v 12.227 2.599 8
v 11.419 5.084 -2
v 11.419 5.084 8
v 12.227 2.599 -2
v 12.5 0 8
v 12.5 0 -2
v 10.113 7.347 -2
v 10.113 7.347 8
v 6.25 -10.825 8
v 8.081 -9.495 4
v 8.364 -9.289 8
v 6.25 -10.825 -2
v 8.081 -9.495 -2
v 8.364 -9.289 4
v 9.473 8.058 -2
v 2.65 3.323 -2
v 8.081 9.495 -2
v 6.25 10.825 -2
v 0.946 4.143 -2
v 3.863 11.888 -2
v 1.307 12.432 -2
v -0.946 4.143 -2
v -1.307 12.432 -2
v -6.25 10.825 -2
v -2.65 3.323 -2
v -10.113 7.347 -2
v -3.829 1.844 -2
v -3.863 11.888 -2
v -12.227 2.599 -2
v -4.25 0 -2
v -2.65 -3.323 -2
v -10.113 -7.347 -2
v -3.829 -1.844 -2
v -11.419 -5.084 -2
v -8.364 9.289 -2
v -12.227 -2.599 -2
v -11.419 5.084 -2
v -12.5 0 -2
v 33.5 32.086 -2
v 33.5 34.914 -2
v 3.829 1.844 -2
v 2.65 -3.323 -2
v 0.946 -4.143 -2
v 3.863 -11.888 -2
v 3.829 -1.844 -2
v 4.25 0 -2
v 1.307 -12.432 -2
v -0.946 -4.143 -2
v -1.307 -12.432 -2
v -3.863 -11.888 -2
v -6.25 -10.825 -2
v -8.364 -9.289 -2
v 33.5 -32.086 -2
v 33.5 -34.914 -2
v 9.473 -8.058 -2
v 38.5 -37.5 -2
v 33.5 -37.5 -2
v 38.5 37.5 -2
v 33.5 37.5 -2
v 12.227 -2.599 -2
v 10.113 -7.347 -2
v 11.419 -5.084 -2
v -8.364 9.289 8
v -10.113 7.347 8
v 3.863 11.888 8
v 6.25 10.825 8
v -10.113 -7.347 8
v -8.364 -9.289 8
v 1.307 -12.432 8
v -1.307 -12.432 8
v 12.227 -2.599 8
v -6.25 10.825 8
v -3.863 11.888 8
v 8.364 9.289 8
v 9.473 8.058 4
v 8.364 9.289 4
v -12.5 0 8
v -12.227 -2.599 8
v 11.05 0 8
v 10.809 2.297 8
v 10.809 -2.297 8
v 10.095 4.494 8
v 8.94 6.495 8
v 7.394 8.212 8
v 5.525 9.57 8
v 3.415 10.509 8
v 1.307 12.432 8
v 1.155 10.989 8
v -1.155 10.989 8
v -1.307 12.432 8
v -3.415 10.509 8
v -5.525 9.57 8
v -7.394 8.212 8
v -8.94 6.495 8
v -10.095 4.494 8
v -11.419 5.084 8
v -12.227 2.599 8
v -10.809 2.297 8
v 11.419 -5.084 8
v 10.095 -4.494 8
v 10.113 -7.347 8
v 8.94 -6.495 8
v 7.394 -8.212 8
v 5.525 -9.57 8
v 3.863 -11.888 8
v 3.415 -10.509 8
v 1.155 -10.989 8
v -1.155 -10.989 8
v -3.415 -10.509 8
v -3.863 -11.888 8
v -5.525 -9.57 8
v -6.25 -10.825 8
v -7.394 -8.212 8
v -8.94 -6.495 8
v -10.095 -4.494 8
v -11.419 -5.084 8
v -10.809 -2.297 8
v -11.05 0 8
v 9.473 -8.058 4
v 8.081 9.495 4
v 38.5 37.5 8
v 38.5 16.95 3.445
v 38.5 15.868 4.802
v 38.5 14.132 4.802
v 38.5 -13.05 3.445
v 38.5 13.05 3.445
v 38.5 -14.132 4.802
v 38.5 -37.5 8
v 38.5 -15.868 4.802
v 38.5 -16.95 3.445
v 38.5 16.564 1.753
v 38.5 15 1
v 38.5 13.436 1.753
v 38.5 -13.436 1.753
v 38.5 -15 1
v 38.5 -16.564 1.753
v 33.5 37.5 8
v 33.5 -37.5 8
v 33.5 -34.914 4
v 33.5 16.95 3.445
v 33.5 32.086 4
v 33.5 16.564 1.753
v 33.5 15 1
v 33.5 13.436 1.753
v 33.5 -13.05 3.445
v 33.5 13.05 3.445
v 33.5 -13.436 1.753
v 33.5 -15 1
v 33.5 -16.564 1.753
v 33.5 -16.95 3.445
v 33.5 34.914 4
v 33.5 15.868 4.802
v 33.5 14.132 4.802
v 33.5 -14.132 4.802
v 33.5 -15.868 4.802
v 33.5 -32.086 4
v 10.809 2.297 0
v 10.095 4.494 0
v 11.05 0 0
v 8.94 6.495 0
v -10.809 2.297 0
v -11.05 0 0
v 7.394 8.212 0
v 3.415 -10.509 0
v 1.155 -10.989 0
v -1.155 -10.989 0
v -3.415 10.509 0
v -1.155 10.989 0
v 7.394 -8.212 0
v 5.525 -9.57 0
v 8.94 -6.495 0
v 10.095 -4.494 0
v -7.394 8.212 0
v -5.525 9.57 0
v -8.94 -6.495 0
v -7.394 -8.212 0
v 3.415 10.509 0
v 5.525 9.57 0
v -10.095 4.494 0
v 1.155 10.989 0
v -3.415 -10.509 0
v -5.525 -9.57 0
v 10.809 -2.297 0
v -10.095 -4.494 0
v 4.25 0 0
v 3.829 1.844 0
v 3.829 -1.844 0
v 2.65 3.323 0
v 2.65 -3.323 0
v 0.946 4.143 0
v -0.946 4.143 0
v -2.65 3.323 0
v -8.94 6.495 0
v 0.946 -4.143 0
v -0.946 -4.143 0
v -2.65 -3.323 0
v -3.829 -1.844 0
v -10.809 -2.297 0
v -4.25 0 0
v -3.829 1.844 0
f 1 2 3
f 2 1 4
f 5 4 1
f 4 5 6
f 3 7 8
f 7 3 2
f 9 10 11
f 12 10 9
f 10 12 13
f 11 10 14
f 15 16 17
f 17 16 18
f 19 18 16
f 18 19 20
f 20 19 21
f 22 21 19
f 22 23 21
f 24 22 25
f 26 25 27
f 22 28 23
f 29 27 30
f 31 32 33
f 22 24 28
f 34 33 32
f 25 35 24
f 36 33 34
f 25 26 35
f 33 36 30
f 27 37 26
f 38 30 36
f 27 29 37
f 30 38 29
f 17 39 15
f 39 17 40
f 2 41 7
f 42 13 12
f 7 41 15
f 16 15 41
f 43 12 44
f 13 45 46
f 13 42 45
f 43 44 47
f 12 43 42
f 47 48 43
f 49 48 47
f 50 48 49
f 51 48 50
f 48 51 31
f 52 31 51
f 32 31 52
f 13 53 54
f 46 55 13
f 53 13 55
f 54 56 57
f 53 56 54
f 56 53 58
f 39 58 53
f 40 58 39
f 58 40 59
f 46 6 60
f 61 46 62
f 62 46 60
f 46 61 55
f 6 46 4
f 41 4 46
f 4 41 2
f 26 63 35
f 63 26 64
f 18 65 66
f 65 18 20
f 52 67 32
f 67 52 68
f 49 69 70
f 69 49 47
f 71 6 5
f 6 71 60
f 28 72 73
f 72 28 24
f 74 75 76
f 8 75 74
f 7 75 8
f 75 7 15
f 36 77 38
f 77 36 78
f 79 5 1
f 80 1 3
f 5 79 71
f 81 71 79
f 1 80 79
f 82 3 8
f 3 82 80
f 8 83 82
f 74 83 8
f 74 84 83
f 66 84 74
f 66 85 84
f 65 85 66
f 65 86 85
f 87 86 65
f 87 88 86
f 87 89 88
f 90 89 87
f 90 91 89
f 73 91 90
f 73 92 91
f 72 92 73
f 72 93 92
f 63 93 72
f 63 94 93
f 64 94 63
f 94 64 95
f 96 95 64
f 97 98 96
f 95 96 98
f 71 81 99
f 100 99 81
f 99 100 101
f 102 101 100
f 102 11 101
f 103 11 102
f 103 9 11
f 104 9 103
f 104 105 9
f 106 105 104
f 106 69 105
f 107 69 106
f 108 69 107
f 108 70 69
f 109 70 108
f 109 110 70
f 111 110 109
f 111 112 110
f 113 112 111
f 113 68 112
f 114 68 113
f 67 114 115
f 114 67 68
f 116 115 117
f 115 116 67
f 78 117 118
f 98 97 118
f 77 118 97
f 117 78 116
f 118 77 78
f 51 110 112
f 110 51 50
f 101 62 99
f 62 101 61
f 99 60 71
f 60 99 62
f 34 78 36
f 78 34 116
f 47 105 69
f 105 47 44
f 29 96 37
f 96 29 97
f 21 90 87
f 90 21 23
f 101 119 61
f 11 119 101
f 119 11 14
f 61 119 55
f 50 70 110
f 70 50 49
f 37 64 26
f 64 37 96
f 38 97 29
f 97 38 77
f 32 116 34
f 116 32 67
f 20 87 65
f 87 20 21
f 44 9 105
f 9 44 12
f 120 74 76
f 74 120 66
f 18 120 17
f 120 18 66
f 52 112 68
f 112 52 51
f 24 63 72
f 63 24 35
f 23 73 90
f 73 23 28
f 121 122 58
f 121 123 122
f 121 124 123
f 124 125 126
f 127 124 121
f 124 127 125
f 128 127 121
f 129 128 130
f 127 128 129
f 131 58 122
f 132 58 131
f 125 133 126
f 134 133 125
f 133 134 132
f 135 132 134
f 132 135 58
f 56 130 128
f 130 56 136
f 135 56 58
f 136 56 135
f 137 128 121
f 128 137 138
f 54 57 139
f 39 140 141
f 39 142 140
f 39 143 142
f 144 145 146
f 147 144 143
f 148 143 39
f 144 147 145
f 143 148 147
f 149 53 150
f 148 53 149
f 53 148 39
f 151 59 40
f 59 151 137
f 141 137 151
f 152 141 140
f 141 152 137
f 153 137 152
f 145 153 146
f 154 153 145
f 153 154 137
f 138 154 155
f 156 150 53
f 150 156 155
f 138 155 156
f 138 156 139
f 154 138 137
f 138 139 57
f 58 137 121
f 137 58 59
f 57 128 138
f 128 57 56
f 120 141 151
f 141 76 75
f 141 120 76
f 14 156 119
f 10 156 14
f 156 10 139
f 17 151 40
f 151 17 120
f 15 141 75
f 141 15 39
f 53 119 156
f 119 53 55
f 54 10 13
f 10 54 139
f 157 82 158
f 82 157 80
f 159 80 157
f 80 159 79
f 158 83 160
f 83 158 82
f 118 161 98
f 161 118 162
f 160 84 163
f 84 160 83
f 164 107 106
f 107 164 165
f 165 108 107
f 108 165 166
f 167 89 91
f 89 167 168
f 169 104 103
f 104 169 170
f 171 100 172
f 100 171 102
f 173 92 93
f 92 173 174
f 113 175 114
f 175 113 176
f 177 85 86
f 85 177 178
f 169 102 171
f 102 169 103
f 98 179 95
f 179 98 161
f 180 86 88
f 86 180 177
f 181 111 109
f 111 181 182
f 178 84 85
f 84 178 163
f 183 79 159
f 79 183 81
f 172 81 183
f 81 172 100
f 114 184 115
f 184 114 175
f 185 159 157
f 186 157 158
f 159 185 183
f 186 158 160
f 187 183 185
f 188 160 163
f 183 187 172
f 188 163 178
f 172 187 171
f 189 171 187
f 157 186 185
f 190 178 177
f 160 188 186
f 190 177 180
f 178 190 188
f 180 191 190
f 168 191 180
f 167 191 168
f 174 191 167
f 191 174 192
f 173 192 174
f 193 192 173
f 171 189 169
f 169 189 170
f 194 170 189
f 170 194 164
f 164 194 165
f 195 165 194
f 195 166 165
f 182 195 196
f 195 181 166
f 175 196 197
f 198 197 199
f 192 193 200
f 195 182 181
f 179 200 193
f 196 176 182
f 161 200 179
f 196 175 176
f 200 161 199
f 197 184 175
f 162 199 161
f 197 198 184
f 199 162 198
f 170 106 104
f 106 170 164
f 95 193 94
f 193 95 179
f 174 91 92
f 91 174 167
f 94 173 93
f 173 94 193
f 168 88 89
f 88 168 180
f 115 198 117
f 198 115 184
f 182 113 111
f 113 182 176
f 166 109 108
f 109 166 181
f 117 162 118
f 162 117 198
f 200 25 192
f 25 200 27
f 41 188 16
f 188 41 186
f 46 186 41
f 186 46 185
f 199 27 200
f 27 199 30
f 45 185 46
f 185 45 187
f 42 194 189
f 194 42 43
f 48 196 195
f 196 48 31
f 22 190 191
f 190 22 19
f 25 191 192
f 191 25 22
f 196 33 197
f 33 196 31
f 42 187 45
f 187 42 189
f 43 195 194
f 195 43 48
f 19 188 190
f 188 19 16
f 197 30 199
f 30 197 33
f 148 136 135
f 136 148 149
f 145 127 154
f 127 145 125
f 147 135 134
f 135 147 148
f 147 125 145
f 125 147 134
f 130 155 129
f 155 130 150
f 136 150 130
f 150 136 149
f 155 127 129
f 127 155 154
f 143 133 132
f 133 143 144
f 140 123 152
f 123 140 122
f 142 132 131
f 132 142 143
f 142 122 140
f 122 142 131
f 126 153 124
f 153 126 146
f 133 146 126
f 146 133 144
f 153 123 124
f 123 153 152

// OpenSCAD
difference() {
    union() {
        translate([0,0,-2])cylinder(10,d=25);
        translate([33.5,-37.5,-2]) cube([5,75,10]);
        rotate([0,0,45]) translate([23,0,1]) cube([55,2,6],true);
        rotate([0,0,-45]) translate([23,0,1]) cube([55,2,6],true);
    }
    translate([0,0,0])cylinder(10,d=22.1);
    translate([0,0,-2])cylinder(10,d=8.5);
    translate([30,-15,3])rotate([0,90,0])cylinder(10,2,2);
    translate([30,15,3])rotate([0,90,0])cylinder(10,2,2);
}
